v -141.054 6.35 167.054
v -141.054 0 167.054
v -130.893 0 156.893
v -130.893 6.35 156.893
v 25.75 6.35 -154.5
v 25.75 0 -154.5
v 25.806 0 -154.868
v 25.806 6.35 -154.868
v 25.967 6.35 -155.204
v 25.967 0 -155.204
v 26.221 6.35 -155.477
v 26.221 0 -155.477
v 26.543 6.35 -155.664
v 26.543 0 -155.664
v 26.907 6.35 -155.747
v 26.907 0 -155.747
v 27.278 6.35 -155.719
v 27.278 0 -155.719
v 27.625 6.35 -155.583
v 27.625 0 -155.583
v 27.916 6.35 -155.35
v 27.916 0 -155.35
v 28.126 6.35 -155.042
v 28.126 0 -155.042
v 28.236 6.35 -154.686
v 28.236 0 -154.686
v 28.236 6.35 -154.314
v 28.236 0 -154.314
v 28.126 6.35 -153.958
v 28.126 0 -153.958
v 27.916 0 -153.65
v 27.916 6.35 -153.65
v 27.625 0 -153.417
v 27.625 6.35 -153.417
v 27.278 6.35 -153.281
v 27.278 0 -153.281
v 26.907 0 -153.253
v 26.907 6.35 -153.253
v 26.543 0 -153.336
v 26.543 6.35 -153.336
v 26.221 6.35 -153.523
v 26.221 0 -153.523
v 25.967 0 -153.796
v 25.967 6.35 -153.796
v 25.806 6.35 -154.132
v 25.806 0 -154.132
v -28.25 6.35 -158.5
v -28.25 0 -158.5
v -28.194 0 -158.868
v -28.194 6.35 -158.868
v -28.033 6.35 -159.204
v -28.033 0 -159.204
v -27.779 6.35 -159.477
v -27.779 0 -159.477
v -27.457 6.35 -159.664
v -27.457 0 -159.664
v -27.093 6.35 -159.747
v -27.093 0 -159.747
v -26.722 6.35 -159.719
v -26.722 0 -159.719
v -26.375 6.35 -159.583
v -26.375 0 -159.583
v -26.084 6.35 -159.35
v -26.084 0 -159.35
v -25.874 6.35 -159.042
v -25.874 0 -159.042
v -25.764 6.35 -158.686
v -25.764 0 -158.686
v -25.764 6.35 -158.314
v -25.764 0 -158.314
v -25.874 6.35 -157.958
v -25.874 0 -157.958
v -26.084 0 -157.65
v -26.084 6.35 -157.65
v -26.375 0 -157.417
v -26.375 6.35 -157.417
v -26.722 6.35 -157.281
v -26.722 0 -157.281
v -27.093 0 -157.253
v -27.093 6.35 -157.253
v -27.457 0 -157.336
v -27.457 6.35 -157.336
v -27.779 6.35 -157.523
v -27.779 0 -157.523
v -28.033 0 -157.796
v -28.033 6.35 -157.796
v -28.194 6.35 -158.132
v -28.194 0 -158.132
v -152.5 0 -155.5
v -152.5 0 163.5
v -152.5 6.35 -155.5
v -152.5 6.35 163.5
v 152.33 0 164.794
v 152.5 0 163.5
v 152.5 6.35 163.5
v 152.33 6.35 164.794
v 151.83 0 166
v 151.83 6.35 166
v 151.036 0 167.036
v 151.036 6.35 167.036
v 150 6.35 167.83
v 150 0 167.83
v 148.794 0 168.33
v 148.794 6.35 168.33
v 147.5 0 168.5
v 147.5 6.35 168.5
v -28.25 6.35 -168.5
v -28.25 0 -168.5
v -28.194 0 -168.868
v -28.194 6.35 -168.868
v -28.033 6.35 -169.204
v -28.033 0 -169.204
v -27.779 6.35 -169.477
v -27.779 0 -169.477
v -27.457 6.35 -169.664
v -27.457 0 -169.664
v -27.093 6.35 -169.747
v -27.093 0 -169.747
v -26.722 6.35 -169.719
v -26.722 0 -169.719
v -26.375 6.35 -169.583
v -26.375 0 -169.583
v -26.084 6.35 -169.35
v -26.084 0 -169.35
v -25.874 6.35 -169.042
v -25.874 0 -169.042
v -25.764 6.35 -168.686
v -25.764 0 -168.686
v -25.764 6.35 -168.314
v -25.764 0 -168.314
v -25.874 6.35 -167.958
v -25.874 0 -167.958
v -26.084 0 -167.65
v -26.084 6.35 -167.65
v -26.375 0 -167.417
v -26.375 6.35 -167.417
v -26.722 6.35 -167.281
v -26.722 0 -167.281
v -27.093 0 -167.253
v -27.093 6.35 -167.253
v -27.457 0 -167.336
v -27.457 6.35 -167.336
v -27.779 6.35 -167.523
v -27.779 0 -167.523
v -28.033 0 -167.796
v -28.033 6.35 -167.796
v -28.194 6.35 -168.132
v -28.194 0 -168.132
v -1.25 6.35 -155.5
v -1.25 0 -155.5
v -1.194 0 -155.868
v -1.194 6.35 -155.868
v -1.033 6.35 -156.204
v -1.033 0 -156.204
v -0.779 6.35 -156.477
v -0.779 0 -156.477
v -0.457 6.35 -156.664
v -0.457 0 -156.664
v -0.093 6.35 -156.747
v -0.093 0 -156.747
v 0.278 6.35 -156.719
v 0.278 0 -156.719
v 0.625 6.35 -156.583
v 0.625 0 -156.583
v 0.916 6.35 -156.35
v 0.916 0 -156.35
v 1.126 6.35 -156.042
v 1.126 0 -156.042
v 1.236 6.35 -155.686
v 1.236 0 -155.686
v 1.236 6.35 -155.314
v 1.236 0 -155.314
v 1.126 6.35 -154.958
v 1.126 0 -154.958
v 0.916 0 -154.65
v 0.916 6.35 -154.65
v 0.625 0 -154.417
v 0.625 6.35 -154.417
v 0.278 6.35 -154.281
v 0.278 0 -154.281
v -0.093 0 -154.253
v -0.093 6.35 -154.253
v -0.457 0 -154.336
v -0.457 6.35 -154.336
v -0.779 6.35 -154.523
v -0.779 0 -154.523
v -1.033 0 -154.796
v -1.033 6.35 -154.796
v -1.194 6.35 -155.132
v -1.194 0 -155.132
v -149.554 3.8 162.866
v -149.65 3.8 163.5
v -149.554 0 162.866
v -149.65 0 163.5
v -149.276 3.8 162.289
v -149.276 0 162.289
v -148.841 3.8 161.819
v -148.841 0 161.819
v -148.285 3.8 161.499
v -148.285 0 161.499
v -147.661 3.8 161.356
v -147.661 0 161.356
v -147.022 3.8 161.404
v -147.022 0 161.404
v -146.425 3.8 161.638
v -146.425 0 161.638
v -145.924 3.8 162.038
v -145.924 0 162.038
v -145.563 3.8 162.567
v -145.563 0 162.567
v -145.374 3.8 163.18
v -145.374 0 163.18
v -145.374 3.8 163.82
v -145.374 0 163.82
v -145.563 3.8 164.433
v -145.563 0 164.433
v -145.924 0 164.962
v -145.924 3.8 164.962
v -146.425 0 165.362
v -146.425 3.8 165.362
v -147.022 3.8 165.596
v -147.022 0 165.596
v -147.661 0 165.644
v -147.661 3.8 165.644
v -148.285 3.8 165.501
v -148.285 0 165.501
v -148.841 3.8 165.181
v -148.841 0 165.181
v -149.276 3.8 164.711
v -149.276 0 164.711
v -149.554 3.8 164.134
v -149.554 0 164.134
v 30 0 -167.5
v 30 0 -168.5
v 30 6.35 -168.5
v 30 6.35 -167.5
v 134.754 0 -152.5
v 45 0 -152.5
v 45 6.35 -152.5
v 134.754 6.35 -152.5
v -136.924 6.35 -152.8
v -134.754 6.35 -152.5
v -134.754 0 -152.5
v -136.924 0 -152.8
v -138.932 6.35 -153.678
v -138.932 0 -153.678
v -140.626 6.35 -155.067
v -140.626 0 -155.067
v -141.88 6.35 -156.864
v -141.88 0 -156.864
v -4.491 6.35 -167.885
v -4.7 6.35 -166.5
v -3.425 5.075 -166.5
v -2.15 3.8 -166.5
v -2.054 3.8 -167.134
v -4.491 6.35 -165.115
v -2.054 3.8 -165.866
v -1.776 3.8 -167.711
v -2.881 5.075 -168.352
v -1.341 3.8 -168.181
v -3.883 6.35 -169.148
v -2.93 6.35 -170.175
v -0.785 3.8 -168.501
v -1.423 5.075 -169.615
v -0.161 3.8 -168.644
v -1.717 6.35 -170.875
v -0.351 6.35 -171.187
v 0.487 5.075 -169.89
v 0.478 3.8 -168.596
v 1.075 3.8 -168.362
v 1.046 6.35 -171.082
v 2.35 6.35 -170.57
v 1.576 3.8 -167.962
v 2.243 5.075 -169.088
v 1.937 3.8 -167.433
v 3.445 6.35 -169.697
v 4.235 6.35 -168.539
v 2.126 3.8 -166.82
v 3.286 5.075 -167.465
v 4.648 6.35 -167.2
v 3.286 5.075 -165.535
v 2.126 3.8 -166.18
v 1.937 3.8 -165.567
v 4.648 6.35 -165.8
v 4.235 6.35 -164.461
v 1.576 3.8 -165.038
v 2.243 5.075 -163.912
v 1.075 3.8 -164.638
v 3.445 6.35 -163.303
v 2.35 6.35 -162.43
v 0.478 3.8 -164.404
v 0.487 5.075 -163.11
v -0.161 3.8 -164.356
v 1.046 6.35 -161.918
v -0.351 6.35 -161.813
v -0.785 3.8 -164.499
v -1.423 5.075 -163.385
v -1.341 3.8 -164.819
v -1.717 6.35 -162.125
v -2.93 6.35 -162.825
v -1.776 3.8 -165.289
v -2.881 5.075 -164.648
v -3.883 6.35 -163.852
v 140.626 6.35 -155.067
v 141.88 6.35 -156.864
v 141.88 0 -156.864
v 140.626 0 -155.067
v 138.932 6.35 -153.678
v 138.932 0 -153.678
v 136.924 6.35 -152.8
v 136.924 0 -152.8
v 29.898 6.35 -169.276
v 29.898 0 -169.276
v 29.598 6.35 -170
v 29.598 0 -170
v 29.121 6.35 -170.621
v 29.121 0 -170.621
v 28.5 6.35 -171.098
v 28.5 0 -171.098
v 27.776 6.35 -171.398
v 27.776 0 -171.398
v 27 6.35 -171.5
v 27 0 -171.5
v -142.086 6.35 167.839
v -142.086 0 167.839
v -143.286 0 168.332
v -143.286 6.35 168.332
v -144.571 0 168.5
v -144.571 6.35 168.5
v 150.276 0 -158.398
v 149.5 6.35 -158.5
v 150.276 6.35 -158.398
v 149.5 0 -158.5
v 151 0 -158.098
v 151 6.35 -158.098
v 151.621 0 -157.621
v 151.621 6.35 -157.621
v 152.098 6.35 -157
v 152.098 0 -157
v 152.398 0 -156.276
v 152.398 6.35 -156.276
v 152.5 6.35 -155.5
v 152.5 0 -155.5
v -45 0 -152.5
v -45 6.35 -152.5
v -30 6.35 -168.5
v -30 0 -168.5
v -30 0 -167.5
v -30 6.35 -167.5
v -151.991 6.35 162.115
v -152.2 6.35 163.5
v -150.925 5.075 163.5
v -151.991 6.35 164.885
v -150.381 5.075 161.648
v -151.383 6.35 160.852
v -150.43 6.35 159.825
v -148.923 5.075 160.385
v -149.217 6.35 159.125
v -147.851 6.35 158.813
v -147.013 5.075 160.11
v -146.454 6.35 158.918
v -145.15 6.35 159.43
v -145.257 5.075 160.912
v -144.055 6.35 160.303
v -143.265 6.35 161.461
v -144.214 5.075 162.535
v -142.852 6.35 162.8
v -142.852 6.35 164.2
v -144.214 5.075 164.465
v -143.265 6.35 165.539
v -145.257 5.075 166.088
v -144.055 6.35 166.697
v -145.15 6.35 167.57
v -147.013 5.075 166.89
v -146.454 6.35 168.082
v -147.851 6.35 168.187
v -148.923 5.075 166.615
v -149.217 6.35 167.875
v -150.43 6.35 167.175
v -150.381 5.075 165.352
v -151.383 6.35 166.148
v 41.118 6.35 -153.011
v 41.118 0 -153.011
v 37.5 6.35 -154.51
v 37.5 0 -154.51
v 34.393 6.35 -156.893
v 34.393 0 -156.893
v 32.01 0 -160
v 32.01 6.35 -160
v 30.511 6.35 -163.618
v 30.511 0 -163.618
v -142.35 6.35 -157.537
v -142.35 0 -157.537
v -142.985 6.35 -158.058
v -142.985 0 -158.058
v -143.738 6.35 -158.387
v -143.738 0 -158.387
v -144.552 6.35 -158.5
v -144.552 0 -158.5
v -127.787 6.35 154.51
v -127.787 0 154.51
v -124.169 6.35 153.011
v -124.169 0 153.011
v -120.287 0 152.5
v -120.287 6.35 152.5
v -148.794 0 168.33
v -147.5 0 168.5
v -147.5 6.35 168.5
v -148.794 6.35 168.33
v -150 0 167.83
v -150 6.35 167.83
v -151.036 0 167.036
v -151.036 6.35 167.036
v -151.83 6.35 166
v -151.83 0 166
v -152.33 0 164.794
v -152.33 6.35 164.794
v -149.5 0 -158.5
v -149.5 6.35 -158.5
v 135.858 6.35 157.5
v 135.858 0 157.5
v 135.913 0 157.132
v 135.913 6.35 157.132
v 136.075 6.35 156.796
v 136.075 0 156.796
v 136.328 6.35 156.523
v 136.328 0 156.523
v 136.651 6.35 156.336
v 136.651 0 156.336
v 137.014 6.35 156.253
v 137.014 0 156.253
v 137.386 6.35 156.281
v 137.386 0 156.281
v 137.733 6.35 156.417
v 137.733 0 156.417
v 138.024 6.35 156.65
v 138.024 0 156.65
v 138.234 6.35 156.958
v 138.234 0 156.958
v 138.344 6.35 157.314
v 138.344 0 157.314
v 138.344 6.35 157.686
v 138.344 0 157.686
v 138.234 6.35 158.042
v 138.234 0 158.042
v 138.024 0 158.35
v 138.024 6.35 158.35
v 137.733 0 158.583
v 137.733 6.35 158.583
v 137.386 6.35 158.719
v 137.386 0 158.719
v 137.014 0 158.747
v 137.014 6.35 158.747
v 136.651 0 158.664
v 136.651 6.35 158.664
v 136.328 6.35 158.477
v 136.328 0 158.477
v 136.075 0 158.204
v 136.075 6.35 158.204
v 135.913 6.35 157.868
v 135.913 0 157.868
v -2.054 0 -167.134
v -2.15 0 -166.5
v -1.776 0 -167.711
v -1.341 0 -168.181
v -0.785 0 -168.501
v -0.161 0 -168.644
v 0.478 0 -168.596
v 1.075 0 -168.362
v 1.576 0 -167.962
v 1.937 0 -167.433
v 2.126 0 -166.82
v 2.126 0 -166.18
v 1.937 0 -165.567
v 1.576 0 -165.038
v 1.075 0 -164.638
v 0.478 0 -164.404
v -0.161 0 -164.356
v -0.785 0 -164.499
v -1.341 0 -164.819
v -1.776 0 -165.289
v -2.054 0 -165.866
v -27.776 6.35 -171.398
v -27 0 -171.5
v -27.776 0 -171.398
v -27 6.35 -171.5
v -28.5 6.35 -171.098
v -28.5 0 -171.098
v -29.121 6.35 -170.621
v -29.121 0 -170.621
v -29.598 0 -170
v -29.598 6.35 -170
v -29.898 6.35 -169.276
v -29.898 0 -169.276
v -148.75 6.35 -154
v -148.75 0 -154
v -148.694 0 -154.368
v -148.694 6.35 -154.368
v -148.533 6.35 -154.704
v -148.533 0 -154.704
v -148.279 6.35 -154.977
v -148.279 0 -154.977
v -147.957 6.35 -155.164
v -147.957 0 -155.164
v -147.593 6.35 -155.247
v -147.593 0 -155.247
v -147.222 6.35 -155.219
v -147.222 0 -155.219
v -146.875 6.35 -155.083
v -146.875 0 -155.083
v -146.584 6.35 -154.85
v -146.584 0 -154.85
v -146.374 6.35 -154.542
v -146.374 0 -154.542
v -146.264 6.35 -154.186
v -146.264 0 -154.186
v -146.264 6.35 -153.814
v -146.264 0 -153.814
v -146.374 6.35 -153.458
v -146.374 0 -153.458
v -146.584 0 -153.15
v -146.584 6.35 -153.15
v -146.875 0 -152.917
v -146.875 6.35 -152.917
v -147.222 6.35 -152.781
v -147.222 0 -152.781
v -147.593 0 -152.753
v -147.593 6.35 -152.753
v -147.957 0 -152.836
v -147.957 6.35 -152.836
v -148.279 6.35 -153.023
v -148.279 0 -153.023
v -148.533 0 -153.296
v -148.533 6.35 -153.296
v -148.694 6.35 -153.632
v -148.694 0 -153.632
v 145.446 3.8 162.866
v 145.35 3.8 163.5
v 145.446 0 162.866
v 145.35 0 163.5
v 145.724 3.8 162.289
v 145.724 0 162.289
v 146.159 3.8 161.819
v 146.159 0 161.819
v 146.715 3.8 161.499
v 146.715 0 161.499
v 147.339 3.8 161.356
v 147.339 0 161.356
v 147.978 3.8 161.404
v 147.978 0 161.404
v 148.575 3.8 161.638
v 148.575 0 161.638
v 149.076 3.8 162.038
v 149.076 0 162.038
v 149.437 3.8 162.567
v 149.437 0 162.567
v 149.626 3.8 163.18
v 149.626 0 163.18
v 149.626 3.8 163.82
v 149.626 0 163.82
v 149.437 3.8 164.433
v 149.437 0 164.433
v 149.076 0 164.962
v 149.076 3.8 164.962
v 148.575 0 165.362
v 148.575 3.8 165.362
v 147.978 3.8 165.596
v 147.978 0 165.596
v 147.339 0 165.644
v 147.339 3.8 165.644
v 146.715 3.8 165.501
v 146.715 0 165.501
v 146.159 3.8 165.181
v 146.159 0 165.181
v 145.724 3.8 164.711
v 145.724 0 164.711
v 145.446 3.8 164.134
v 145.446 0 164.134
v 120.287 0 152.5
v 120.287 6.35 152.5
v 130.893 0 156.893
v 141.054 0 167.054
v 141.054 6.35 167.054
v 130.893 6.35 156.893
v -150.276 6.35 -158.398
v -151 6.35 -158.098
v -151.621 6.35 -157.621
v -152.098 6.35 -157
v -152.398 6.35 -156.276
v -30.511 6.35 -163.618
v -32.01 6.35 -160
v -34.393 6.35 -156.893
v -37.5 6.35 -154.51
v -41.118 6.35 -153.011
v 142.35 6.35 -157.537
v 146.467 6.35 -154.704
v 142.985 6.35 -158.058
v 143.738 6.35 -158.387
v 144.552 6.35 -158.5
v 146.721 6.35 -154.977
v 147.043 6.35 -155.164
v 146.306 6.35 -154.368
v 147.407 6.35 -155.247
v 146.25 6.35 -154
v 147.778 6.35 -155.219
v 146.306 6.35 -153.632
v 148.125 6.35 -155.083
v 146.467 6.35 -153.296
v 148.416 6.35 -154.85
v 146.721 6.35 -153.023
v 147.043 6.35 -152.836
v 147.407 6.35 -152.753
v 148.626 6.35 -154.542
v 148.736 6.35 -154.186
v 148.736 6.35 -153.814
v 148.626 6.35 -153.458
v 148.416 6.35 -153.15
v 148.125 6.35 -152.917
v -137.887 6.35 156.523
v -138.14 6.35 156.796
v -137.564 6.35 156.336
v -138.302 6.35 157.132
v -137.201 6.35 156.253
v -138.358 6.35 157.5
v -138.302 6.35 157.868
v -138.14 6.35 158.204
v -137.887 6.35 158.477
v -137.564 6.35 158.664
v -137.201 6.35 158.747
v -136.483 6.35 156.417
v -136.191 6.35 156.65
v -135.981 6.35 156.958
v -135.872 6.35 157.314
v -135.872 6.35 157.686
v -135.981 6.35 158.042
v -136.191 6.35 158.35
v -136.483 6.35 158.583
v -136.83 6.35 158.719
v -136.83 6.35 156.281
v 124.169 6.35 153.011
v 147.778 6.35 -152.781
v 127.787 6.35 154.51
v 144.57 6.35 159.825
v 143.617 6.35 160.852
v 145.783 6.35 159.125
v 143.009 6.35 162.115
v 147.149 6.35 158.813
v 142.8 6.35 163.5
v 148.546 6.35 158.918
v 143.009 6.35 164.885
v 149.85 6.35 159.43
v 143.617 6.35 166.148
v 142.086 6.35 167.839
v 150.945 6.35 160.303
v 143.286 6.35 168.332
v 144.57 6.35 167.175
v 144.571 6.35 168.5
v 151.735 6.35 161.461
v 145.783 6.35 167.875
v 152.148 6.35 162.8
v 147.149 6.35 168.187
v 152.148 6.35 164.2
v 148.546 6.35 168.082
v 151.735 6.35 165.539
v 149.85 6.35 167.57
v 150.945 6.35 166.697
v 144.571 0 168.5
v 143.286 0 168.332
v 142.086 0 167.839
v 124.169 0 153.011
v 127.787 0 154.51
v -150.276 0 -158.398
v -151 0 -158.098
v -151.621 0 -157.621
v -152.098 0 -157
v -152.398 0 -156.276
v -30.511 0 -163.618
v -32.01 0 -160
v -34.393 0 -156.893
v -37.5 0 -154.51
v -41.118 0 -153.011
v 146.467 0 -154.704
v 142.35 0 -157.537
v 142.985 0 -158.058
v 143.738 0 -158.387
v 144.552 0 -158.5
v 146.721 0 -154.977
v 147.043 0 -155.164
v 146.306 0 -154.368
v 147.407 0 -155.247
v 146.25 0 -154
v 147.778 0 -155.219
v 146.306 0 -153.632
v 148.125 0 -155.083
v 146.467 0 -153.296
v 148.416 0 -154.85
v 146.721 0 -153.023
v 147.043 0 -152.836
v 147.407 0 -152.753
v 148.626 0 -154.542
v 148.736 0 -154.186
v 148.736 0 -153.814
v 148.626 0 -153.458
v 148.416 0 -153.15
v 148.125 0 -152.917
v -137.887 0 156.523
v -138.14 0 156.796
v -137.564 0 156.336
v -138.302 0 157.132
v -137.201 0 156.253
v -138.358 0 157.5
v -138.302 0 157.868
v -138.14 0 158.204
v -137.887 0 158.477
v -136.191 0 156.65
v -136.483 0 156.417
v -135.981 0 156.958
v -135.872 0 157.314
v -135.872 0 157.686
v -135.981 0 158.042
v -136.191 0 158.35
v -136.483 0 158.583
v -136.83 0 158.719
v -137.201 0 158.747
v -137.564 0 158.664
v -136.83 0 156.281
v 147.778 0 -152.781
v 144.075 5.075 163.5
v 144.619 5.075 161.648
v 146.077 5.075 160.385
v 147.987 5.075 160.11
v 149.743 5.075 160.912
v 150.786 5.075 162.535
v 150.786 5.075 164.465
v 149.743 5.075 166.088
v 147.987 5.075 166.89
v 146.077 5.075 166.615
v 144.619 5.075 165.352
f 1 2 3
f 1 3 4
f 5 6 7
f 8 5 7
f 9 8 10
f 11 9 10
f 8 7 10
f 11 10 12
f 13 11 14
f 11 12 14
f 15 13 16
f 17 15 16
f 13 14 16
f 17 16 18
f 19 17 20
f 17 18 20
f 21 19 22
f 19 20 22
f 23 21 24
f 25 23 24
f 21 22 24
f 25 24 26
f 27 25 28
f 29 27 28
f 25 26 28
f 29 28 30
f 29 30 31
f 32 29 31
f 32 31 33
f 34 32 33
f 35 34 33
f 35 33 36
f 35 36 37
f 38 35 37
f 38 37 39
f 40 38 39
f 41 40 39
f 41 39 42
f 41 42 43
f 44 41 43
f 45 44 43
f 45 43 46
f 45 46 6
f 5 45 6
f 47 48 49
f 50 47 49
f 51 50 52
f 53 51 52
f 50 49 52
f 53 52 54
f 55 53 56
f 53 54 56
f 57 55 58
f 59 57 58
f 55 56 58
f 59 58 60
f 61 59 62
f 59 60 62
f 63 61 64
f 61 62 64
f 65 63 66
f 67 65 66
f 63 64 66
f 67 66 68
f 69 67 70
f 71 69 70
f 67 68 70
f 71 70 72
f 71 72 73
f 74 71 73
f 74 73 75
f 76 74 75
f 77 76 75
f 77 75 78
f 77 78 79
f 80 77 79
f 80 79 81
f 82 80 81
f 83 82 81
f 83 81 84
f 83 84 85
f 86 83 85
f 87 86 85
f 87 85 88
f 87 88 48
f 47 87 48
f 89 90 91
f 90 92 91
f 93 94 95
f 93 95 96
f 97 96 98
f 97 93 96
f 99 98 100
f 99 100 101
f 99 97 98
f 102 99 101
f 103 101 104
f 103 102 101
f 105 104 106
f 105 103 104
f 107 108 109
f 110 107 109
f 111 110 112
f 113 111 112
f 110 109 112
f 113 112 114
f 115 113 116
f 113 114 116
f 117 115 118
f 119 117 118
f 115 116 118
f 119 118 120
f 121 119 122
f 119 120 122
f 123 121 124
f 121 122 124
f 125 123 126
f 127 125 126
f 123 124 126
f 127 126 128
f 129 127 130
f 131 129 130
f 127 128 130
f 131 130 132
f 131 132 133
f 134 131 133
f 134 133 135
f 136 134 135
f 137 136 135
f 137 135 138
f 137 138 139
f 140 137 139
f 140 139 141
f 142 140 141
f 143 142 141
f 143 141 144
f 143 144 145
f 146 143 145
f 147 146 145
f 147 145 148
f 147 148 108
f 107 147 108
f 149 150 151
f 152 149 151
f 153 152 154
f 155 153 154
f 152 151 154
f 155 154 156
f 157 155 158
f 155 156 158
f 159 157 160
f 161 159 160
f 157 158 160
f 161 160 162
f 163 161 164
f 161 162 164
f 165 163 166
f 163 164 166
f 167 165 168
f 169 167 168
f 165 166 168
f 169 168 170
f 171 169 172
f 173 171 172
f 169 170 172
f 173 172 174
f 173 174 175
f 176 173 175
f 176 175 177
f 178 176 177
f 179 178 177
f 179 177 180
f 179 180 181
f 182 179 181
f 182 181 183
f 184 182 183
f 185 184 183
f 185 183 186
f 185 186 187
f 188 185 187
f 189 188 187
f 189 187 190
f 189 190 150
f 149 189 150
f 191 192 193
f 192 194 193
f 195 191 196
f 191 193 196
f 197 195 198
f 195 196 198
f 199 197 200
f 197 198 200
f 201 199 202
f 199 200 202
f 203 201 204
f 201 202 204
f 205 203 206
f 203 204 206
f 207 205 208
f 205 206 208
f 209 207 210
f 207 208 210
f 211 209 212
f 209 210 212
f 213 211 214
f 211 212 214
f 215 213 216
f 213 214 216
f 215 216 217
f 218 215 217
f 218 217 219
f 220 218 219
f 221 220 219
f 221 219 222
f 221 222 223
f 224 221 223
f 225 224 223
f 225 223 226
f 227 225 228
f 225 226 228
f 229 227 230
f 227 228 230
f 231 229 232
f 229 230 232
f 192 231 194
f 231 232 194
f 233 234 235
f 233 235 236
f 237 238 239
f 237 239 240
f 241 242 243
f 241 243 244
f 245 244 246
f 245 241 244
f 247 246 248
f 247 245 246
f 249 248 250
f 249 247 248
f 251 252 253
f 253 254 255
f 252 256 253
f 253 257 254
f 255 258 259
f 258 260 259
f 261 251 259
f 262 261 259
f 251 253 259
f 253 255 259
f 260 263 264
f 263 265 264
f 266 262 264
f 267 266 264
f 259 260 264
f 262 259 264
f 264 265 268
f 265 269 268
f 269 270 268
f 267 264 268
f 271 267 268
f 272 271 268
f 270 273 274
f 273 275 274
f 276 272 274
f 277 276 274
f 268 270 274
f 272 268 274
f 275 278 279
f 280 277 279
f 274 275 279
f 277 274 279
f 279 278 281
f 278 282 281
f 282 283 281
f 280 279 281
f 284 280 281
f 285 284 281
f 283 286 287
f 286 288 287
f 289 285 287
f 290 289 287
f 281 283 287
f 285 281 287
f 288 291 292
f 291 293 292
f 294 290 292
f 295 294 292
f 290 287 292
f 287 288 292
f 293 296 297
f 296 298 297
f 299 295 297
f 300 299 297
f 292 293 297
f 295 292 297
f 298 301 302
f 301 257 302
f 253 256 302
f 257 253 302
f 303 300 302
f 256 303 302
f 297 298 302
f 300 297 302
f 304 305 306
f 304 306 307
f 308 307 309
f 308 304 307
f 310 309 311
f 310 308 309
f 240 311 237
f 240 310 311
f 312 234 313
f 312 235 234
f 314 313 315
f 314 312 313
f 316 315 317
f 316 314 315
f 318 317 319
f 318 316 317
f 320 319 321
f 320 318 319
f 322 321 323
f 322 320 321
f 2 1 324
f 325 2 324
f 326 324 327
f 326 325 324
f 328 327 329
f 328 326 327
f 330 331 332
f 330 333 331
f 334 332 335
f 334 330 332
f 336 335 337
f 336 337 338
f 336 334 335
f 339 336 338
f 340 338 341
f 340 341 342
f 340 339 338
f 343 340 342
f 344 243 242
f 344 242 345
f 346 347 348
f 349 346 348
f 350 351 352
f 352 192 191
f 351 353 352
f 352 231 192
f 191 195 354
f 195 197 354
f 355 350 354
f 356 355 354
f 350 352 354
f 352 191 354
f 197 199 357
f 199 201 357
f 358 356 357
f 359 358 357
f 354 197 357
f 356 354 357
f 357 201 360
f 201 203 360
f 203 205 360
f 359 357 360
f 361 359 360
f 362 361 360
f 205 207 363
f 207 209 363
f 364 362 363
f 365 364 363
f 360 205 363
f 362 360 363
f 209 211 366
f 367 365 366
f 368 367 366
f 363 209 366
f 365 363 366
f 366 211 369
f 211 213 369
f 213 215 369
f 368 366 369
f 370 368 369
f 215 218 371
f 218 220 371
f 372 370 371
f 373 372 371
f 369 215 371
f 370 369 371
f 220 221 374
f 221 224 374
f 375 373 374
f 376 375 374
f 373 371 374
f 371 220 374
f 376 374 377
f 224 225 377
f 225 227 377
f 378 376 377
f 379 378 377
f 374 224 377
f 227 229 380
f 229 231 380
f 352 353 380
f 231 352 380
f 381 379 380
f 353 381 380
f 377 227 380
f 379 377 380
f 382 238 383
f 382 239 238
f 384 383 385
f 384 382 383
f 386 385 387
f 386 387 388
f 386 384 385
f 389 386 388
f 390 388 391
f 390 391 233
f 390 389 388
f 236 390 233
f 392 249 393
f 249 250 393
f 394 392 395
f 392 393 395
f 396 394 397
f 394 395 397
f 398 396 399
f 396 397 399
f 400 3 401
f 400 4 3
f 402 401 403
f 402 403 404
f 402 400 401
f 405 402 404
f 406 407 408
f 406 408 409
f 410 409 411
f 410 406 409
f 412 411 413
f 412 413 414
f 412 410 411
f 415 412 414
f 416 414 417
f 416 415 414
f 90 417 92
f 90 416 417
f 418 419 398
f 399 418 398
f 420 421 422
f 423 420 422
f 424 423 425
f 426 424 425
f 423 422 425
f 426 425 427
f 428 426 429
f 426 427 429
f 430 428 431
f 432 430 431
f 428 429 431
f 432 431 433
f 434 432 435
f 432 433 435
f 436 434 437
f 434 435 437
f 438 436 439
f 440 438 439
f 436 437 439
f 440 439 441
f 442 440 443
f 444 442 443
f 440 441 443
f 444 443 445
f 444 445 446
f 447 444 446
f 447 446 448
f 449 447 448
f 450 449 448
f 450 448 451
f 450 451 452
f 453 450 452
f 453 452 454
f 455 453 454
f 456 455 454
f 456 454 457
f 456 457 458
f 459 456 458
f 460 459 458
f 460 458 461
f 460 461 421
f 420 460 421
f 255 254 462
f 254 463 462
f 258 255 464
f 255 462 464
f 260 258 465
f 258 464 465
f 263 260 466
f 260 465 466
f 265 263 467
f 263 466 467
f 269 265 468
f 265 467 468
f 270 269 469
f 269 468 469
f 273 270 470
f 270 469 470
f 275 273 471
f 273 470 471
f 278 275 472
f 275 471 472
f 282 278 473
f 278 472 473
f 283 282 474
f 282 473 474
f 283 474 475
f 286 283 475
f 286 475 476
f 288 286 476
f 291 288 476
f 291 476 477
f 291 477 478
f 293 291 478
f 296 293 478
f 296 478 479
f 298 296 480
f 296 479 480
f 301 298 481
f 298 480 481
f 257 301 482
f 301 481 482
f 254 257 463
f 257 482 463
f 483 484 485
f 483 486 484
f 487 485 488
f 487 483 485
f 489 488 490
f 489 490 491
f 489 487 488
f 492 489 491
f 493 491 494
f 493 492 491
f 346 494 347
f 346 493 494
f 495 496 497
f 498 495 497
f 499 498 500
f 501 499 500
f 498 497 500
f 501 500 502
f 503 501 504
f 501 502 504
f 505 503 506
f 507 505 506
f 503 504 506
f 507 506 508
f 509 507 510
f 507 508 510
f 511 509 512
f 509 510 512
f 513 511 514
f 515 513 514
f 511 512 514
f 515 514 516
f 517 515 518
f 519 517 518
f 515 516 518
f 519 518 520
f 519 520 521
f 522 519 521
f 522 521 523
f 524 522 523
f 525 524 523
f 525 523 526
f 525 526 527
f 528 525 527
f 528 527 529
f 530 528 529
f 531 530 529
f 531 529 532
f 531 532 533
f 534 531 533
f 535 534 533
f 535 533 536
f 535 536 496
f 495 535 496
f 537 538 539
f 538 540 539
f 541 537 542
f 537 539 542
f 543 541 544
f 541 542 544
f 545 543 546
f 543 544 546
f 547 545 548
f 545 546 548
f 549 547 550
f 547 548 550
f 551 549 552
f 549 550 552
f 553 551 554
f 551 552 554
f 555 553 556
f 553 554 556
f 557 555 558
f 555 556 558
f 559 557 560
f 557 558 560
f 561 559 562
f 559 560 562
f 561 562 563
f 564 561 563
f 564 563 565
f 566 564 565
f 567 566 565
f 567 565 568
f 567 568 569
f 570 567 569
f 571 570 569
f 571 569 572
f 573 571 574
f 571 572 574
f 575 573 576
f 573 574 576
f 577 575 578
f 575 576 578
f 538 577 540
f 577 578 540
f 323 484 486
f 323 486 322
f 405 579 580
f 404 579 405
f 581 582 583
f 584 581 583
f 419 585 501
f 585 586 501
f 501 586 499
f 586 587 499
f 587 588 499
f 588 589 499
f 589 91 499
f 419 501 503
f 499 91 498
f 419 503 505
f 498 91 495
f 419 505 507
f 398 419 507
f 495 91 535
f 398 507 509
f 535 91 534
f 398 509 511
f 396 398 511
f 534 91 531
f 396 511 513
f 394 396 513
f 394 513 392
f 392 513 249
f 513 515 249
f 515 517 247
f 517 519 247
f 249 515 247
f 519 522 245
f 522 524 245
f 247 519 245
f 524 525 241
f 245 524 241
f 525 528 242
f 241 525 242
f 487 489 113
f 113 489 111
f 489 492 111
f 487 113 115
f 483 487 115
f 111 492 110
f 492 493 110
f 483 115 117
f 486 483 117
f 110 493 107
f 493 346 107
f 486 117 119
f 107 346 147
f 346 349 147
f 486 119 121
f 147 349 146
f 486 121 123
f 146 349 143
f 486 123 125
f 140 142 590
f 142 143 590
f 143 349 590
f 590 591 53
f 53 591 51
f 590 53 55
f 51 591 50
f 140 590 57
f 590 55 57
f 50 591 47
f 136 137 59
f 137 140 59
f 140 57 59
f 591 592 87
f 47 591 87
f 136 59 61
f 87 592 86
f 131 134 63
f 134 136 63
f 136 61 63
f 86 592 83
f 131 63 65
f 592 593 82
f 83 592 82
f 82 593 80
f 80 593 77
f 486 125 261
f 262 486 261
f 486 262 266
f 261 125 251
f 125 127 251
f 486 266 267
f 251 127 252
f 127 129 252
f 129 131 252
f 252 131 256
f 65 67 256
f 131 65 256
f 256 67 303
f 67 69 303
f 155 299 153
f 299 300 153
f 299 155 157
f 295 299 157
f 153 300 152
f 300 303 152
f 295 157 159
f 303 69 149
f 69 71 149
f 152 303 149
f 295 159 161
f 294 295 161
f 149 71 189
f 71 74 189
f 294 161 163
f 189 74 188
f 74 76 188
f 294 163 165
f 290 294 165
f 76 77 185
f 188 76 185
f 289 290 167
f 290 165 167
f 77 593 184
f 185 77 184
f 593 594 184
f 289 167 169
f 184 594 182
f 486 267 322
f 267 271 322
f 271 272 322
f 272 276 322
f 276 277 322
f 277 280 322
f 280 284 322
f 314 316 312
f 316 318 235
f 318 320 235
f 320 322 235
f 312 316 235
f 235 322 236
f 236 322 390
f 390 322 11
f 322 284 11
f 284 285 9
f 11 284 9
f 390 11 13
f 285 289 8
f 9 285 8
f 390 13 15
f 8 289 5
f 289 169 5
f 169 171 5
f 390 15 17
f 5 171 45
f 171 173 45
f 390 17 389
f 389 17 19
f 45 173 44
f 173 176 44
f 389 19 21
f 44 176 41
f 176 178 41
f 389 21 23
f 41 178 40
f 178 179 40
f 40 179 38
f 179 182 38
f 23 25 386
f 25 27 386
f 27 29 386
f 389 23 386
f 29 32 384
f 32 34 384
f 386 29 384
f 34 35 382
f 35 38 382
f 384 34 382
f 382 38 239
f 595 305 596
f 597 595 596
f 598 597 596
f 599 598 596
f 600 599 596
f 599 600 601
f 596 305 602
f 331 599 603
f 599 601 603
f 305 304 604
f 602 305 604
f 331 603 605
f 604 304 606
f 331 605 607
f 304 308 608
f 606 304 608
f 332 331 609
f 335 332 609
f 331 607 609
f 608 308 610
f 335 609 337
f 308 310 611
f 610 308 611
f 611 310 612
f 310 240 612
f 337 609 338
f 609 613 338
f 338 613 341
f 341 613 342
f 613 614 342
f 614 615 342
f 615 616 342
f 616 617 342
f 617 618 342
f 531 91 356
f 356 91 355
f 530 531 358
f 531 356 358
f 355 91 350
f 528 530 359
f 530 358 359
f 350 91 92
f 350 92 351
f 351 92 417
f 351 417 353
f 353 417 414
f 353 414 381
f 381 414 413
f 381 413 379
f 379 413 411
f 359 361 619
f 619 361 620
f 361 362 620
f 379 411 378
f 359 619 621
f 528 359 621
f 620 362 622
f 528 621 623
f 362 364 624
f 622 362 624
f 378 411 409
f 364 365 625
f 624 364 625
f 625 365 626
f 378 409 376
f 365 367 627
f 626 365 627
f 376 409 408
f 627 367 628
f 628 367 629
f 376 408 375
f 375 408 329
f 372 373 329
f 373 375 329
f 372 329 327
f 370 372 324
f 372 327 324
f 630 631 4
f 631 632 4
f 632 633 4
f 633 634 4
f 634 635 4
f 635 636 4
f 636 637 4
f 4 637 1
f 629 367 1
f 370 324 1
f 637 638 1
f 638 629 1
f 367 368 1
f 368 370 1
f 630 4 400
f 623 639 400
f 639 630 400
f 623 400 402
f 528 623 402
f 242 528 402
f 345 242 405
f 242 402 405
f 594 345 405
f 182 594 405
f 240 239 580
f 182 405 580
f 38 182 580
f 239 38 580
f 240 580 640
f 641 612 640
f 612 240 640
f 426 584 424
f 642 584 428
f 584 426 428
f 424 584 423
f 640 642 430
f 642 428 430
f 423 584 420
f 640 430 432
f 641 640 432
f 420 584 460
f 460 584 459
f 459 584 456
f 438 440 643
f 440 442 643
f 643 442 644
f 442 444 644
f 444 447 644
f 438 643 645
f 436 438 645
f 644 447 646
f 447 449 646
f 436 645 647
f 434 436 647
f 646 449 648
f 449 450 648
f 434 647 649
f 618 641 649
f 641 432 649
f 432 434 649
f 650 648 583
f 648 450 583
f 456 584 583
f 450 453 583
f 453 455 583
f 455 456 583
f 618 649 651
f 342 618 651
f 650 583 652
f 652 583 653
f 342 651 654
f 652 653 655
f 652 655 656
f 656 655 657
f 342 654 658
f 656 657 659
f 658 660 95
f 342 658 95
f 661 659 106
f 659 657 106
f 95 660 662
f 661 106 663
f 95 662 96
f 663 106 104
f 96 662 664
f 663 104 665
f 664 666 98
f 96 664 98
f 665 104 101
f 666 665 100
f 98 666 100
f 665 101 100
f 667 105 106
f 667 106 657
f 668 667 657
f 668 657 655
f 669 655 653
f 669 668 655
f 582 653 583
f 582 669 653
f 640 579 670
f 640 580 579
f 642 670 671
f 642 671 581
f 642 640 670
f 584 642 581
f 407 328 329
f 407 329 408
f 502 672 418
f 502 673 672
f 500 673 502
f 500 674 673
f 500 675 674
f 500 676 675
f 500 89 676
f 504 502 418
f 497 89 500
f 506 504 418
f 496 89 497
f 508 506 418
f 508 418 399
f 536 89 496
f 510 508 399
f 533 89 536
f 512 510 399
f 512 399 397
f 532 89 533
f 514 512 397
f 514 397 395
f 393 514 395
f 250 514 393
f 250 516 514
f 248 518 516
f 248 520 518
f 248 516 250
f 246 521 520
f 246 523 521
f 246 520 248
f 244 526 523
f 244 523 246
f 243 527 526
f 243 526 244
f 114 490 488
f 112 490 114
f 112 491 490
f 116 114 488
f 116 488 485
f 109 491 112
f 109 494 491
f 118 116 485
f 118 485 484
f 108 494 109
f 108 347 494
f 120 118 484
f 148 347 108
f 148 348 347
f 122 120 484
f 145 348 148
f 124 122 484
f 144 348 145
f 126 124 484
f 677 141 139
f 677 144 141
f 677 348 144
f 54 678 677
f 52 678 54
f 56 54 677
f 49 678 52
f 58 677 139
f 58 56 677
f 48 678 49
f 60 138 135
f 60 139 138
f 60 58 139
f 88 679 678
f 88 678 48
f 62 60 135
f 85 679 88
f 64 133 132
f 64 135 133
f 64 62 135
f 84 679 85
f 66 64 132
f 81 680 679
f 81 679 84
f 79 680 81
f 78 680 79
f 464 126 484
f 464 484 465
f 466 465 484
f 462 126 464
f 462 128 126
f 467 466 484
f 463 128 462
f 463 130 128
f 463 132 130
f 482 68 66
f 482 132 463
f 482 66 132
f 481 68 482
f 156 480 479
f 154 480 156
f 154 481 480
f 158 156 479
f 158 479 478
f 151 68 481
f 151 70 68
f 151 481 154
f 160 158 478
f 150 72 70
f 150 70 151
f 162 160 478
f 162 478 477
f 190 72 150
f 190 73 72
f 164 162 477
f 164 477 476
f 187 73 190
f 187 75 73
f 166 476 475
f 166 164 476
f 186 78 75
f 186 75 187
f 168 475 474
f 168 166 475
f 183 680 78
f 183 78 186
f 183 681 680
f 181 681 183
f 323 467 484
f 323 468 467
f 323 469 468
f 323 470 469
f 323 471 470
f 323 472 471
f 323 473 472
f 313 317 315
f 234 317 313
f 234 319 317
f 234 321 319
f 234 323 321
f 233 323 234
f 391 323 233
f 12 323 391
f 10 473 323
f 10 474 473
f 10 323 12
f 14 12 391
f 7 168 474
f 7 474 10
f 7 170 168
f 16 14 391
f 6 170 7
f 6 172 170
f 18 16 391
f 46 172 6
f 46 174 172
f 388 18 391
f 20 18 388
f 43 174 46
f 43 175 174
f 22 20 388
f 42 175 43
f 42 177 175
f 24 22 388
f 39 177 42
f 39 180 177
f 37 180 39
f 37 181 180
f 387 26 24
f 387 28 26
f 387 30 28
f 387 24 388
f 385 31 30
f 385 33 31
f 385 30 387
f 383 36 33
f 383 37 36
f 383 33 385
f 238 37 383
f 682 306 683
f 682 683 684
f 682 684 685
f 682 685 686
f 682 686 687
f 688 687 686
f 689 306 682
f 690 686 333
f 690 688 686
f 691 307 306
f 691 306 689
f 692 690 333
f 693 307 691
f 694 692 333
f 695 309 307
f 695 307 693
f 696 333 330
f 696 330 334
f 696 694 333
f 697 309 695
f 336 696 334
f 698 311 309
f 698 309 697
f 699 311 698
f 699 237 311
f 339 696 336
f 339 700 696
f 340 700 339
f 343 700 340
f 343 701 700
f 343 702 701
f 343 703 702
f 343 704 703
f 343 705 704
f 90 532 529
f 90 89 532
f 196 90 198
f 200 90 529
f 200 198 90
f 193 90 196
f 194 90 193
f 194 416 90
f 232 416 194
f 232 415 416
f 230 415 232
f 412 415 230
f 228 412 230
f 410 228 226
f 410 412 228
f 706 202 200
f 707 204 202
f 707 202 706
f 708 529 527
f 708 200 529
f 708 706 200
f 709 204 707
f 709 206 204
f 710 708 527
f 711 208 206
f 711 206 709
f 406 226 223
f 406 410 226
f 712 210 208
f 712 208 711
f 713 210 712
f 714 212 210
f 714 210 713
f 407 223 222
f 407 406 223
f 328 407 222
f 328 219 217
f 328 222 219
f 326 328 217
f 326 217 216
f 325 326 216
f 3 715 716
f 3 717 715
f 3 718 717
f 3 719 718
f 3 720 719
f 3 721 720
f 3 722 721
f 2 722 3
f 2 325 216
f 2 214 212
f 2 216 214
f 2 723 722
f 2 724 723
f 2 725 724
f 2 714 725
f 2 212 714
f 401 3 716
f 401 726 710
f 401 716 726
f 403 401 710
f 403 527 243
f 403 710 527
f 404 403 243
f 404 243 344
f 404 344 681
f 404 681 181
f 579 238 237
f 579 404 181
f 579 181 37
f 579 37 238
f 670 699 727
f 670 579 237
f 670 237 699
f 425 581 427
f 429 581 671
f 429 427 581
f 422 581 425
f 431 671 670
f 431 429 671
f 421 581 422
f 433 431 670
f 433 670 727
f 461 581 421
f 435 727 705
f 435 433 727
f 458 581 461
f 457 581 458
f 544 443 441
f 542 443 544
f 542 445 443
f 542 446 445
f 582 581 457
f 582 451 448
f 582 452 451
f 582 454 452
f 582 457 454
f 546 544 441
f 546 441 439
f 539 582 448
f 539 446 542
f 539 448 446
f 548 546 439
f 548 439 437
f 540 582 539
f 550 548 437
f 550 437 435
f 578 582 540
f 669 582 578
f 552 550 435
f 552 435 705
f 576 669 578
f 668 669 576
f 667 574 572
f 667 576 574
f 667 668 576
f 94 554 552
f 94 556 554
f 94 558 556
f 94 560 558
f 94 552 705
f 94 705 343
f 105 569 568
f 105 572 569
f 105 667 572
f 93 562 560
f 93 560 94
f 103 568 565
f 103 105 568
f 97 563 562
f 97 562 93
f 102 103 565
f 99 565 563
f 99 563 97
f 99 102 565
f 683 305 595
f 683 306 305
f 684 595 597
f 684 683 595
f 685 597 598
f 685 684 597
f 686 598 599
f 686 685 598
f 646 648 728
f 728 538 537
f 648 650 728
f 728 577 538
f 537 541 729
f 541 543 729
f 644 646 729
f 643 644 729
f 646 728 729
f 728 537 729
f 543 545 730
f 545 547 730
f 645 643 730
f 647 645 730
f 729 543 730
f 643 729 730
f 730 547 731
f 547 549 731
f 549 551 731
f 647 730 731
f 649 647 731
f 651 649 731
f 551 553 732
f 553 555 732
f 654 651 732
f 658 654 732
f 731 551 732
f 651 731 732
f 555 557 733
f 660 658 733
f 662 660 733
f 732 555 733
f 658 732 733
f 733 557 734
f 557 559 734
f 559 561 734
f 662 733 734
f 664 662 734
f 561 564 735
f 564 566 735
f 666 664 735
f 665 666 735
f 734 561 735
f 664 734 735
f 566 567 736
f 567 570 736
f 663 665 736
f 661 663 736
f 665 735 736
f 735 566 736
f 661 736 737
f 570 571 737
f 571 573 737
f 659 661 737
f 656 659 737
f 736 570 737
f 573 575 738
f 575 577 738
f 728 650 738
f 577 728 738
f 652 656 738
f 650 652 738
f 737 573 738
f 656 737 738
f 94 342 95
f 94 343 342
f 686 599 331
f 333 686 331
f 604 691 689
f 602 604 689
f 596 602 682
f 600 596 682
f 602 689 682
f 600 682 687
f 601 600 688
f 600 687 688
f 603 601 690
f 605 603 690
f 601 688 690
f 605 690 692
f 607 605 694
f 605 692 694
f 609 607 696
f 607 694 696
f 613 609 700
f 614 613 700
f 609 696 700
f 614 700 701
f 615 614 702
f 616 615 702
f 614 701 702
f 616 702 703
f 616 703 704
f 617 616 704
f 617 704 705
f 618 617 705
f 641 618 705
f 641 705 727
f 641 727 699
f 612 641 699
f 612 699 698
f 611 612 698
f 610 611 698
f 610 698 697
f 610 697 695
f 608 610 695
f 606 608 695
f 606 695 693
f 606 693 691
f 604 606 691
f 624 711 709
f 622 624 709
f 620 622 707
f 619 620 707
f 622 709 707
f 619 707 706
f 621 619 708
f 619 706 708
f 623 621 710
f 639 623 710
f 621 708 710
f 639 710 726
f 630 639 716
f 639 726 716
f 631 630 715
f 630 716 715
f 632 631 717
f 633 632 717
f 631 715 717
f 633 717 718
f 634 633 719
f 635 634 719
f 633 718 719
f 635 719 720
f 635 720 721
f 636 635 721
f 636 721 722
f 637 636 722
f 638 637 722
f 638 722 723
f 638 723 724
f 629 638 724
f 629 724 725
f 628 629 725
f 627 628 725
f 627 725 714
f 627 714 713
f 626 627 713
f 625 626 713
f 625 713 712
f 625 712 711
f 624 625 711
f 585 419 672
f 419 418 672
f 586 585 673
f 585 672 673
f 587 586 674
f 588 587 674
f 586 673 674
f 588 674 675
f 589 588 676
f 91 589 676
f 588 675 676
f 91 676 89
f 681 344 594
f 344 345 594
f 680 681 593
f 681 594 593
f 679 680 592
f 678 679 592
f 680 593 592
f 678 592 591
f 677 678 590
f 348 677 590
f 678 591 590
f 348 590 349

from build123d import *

# Parameters (mm, degrees)
BOSS_EXTRUDE1_DEPTH                             = 6.35
CSK_FOR_M4_FLAT_HEAD_MACHINE_SCREW1_D           = 4.3
CSK_FOR_M4_FLAT_HEAD_MACHINE_SCREW1_CSINK_D     = 9.4
CSK_FOR_M4_FLAT_HEAD_MACHINE_SCREW1_CSINK_ANGLE = 90
CHAMFER1_SIZE                                   = 16
SKETCH6_W                                       = 10
SKETCH6_H                                       = 6
BOSS_EXTRUDE2_DEPTH                             = 6.35
FILLET5_R                                       = 8
M3X0_5_TAPPED_HOLE1_D                           = 2.5
FILLET6_START                                   = -1
FILLET6_DEPTH                                   = 8
SKETCH18_W                                      = 25
SKETCH18_H                                      = 19
BOSS_EXTRUDE4_DEPTH                             = 6.35
FILLET11_R                                      = 15
FILLET12_R                                      = 3
TAP_DRILL_FOR_M3X0_5_TAP2_D                     = 2.5


with BuildPart() as part:
    # Sketch1 → Boss-Extrude1 (new body)
    with BuildSketch(Plane(origin=(0, 0, 0), x_dir=(1, 0, 0), z_dir=(0, 1, 0))):
        Polygon((-5, 171.5), (5, 171.5), (5, 152.5), (152.5, 152.5), (152.5, -168.5), (142.5, -168.5), (142.5, -152.5), (-142.5, -152.5), (-142.5, -168.5), (-152.5, -168.5), (-152.5, 152.5), (-5, 152.5), align=None)
    extrude(amount=BOSS_EXTRUDE1_DEPTH)

    # CSK for M4 Flat Head Machine Screw1 (through all)
    with Locations(Plane(origin=(0, 6.35, 0), x_dir=(1, 0, 0), z_dir=(0, 1, 0))):
        with Locations((0, 166.5), (-147.5, -163.5), (147.5, -163.5)):
            CounterSinkHole(CSK_FOR_M4_FLAT_HEAD_MACHINE_SCREW1_D / 2, CSK_FOR_M4_FLAT_HEAD_MACHINE_SCREW1_CSINK_D / 2, counter_sink_angle=CSK_FOR_M4_FLAT_HEAD_MACHINE_SCREW1_CSINK_ANGLE)

    # Chamfer1
    chamfer1_edges = [part.edges().sort_by_distance(p)[0] for p in [
        (142.5, 3.175, 152.5),
        (-142.5, 3.175, 152.5),
    ]]
    chamfer(chamfer1_edges, length=CHAMFER1_SIZE - 0.0001)  # a hair under: the kernel refuses the full size

    # Sketch6 → Boss-Extrude2 (add)
    with BuildSketch(Plane(origin=(0, 6.35, 0), x_dir=(1, 0, 0), z_dir=(0, 1, 0))):
        with Locations((-147.5, 155.5)):
            Rectangle(SKETCH6_W, SKETCH6_H)
        with Locations((147.5, 155.5)):
            Rectangle(SKETCH6_W, SKETCH6_H)
    extrude(amount=-BOSS_EXTRUDE2_DEPTH)

    # Fillet5
    # the kernel refuses this fillet: 8 mm, written as the material it adds along each edge
    with BuildSketch(Plane(origin=(142.5, 6.35, -152.5), x_dir=(0, 0, -1), z_dir=(0, -1, 0))) as fillet5_piece_1:
        with BuildLine():
            CenterArc((8, -7.745966692), FILLET5_R, 104.477512186, 75.522487814)
            Line((0, -7.745966692), (-0.16, -7.745966692))
            Line((-0.16, -7.745966692), (-0.16, 0))
            Line((-0.16, 0), (0, 0.16))
            ThreePointArc((0, 0.16), (3, 0.16), (5.96, 0.154919334))
            Line((5.96, 0.154919334), (6, 0))
        make_face()
    extrude(amount=6.35)
    with BuildSketch(Plane(origin=(-142.5, 6.35, -152.5), x_dir=(1, 0, 0), z_dir=(0, -1, 0))) as fillet5_piece_2:
        with BuildLine():
            CenterArc((7.745966692, -8), FILLET5_R, 90, 75.522487814)
            Line((0, -6), (-0.154919334, -5.96))
            ThreePointArc((-0.154919334, -5.96), (-0.16, -3), (-0.16, 0))
            Line((-0.16, 0), (0, 0.16))
            Line((0, 0.16), (7.745966692, 0.16))
            Line((7.745966692, 0.16), (7.745966692, 0))
        make_face()
    extrude(amount=6.35)

    # M3x0.5 Tapped Hole1 (through all)
    with Locations(Plane(origin=(0, 6.35, 0), x_dir=(1, 0, 0), z_dir=(0, 1, 0))):
        with Locations((-147.5, 154), (147.5, 154), (137.107695155, -157.5), (-137.107695155, -157.5), (0, 155.5)):
            Hole(M3X0_5_TAPPED_HOLE1_D / 2)

    # Fillet6: read off the stored shape, not the designer's step
    # Fillet6 outline → Fillet6 (cut)
    with BuildSketch(Plane(origin=(0, 0, 0), x_dir=(1, 0, 0), z_dir=(0, 1, 0)).offset(FILLET6_START)):
        with BuildLine():
            ThreePointArc((152.5, -163.5), (151.035533906, -167.035533906), (147.5, -168.5))
            Line((147.5, -168.5), (152.5, -168.5))
            Line((152.5, -168.5), (152.5, -163.5))
        make_face()
        with BuildLine():
            ThreePointArc((144.571067812, -168.5), (142.65765065, -168.119397663), (141.035533906, -167.035533906))
            Line((141.035533906, -167.035533906), (142.5, -168.5))
            Line((142.5, -168.5), (144.571067812, -168.5))
        make_face()
        with BuildLine():
            ThreePointArc((-141.035533906, -167.035533906), (-142.65765065, -168.119397663), (-144.571067812, -168.5))
            Line((-144.571067812, -168.5), (-142.5, -168.5))
            Line((-142.5, -168.5), (-141.035533906, -167.035533906))
        make_face()
        with BuildLine():
            Line((-152.5, -168.5), (-147.5, -168.5))
            ThreePointArc((-147.5, -168.5), (-151.035533906, -167.035533906), (-152.5, -163.5))
            Line((-152.5, -163.5), (-152.5, -168.5))
        make_face()
    extrude(amount=FILLET6_DEPTH, mode=Mode.SUBTRACT)

    # Sketch18 → Boss-Extrude4 (add)
    with BuildSketch(Plane.XZ):
        with Locations((17.5, -162)):
            Rectangle(SKETCH18_W, SKETCH18_H)
        with Locations((-17.5, -162)):
            Rectangle(SKETCH18_W, SKETCH18_H)
    extrude(amount=-BOSS_EXTRUDE4_DEPTH)

    # Fillet11
    fillet11_edges = [part.edges().sort_by_distance(p)[0] for p in [
        (30, 3.175, -152.5),
        (-30, 3.175, -152.5),
        (-126.5001, 3.175, 152.5),
        (126.5001, 3.175, 152.5),
    ]]
    fillet(fillet11_edges, radius=FILLET11_R)

    # Fillet12
    fillet12_edges = [part.edges().sort_by_distance(p)[0] for p in [
        (30, 3.175, -171.5),
        (-30, 3.175, -171.5),
        (-142.5, 3.175, -158.5),
        (-152.5, 3.175, -158.5),
        (142.5, 3.175, -158.5),
        (152.5, 3.175, -158.5),
    ]]
    fillet(fillet12_edges, radius=FILLET12_R)

    # Tap Drill for M3x0.5 Tap2 (through all)
    with Locations(Plane(origin=(0, 6.35, 0), x_dir=(1, 0, 0), z_dir=(0, 1, 0))):
        with Locations((27, 154.5), (-27, 168.5), (-27, 158.5)):
            Hole(TAP_DRILL_FOR_M3X0_5_TAP2_D / 2)


solid = part.part
